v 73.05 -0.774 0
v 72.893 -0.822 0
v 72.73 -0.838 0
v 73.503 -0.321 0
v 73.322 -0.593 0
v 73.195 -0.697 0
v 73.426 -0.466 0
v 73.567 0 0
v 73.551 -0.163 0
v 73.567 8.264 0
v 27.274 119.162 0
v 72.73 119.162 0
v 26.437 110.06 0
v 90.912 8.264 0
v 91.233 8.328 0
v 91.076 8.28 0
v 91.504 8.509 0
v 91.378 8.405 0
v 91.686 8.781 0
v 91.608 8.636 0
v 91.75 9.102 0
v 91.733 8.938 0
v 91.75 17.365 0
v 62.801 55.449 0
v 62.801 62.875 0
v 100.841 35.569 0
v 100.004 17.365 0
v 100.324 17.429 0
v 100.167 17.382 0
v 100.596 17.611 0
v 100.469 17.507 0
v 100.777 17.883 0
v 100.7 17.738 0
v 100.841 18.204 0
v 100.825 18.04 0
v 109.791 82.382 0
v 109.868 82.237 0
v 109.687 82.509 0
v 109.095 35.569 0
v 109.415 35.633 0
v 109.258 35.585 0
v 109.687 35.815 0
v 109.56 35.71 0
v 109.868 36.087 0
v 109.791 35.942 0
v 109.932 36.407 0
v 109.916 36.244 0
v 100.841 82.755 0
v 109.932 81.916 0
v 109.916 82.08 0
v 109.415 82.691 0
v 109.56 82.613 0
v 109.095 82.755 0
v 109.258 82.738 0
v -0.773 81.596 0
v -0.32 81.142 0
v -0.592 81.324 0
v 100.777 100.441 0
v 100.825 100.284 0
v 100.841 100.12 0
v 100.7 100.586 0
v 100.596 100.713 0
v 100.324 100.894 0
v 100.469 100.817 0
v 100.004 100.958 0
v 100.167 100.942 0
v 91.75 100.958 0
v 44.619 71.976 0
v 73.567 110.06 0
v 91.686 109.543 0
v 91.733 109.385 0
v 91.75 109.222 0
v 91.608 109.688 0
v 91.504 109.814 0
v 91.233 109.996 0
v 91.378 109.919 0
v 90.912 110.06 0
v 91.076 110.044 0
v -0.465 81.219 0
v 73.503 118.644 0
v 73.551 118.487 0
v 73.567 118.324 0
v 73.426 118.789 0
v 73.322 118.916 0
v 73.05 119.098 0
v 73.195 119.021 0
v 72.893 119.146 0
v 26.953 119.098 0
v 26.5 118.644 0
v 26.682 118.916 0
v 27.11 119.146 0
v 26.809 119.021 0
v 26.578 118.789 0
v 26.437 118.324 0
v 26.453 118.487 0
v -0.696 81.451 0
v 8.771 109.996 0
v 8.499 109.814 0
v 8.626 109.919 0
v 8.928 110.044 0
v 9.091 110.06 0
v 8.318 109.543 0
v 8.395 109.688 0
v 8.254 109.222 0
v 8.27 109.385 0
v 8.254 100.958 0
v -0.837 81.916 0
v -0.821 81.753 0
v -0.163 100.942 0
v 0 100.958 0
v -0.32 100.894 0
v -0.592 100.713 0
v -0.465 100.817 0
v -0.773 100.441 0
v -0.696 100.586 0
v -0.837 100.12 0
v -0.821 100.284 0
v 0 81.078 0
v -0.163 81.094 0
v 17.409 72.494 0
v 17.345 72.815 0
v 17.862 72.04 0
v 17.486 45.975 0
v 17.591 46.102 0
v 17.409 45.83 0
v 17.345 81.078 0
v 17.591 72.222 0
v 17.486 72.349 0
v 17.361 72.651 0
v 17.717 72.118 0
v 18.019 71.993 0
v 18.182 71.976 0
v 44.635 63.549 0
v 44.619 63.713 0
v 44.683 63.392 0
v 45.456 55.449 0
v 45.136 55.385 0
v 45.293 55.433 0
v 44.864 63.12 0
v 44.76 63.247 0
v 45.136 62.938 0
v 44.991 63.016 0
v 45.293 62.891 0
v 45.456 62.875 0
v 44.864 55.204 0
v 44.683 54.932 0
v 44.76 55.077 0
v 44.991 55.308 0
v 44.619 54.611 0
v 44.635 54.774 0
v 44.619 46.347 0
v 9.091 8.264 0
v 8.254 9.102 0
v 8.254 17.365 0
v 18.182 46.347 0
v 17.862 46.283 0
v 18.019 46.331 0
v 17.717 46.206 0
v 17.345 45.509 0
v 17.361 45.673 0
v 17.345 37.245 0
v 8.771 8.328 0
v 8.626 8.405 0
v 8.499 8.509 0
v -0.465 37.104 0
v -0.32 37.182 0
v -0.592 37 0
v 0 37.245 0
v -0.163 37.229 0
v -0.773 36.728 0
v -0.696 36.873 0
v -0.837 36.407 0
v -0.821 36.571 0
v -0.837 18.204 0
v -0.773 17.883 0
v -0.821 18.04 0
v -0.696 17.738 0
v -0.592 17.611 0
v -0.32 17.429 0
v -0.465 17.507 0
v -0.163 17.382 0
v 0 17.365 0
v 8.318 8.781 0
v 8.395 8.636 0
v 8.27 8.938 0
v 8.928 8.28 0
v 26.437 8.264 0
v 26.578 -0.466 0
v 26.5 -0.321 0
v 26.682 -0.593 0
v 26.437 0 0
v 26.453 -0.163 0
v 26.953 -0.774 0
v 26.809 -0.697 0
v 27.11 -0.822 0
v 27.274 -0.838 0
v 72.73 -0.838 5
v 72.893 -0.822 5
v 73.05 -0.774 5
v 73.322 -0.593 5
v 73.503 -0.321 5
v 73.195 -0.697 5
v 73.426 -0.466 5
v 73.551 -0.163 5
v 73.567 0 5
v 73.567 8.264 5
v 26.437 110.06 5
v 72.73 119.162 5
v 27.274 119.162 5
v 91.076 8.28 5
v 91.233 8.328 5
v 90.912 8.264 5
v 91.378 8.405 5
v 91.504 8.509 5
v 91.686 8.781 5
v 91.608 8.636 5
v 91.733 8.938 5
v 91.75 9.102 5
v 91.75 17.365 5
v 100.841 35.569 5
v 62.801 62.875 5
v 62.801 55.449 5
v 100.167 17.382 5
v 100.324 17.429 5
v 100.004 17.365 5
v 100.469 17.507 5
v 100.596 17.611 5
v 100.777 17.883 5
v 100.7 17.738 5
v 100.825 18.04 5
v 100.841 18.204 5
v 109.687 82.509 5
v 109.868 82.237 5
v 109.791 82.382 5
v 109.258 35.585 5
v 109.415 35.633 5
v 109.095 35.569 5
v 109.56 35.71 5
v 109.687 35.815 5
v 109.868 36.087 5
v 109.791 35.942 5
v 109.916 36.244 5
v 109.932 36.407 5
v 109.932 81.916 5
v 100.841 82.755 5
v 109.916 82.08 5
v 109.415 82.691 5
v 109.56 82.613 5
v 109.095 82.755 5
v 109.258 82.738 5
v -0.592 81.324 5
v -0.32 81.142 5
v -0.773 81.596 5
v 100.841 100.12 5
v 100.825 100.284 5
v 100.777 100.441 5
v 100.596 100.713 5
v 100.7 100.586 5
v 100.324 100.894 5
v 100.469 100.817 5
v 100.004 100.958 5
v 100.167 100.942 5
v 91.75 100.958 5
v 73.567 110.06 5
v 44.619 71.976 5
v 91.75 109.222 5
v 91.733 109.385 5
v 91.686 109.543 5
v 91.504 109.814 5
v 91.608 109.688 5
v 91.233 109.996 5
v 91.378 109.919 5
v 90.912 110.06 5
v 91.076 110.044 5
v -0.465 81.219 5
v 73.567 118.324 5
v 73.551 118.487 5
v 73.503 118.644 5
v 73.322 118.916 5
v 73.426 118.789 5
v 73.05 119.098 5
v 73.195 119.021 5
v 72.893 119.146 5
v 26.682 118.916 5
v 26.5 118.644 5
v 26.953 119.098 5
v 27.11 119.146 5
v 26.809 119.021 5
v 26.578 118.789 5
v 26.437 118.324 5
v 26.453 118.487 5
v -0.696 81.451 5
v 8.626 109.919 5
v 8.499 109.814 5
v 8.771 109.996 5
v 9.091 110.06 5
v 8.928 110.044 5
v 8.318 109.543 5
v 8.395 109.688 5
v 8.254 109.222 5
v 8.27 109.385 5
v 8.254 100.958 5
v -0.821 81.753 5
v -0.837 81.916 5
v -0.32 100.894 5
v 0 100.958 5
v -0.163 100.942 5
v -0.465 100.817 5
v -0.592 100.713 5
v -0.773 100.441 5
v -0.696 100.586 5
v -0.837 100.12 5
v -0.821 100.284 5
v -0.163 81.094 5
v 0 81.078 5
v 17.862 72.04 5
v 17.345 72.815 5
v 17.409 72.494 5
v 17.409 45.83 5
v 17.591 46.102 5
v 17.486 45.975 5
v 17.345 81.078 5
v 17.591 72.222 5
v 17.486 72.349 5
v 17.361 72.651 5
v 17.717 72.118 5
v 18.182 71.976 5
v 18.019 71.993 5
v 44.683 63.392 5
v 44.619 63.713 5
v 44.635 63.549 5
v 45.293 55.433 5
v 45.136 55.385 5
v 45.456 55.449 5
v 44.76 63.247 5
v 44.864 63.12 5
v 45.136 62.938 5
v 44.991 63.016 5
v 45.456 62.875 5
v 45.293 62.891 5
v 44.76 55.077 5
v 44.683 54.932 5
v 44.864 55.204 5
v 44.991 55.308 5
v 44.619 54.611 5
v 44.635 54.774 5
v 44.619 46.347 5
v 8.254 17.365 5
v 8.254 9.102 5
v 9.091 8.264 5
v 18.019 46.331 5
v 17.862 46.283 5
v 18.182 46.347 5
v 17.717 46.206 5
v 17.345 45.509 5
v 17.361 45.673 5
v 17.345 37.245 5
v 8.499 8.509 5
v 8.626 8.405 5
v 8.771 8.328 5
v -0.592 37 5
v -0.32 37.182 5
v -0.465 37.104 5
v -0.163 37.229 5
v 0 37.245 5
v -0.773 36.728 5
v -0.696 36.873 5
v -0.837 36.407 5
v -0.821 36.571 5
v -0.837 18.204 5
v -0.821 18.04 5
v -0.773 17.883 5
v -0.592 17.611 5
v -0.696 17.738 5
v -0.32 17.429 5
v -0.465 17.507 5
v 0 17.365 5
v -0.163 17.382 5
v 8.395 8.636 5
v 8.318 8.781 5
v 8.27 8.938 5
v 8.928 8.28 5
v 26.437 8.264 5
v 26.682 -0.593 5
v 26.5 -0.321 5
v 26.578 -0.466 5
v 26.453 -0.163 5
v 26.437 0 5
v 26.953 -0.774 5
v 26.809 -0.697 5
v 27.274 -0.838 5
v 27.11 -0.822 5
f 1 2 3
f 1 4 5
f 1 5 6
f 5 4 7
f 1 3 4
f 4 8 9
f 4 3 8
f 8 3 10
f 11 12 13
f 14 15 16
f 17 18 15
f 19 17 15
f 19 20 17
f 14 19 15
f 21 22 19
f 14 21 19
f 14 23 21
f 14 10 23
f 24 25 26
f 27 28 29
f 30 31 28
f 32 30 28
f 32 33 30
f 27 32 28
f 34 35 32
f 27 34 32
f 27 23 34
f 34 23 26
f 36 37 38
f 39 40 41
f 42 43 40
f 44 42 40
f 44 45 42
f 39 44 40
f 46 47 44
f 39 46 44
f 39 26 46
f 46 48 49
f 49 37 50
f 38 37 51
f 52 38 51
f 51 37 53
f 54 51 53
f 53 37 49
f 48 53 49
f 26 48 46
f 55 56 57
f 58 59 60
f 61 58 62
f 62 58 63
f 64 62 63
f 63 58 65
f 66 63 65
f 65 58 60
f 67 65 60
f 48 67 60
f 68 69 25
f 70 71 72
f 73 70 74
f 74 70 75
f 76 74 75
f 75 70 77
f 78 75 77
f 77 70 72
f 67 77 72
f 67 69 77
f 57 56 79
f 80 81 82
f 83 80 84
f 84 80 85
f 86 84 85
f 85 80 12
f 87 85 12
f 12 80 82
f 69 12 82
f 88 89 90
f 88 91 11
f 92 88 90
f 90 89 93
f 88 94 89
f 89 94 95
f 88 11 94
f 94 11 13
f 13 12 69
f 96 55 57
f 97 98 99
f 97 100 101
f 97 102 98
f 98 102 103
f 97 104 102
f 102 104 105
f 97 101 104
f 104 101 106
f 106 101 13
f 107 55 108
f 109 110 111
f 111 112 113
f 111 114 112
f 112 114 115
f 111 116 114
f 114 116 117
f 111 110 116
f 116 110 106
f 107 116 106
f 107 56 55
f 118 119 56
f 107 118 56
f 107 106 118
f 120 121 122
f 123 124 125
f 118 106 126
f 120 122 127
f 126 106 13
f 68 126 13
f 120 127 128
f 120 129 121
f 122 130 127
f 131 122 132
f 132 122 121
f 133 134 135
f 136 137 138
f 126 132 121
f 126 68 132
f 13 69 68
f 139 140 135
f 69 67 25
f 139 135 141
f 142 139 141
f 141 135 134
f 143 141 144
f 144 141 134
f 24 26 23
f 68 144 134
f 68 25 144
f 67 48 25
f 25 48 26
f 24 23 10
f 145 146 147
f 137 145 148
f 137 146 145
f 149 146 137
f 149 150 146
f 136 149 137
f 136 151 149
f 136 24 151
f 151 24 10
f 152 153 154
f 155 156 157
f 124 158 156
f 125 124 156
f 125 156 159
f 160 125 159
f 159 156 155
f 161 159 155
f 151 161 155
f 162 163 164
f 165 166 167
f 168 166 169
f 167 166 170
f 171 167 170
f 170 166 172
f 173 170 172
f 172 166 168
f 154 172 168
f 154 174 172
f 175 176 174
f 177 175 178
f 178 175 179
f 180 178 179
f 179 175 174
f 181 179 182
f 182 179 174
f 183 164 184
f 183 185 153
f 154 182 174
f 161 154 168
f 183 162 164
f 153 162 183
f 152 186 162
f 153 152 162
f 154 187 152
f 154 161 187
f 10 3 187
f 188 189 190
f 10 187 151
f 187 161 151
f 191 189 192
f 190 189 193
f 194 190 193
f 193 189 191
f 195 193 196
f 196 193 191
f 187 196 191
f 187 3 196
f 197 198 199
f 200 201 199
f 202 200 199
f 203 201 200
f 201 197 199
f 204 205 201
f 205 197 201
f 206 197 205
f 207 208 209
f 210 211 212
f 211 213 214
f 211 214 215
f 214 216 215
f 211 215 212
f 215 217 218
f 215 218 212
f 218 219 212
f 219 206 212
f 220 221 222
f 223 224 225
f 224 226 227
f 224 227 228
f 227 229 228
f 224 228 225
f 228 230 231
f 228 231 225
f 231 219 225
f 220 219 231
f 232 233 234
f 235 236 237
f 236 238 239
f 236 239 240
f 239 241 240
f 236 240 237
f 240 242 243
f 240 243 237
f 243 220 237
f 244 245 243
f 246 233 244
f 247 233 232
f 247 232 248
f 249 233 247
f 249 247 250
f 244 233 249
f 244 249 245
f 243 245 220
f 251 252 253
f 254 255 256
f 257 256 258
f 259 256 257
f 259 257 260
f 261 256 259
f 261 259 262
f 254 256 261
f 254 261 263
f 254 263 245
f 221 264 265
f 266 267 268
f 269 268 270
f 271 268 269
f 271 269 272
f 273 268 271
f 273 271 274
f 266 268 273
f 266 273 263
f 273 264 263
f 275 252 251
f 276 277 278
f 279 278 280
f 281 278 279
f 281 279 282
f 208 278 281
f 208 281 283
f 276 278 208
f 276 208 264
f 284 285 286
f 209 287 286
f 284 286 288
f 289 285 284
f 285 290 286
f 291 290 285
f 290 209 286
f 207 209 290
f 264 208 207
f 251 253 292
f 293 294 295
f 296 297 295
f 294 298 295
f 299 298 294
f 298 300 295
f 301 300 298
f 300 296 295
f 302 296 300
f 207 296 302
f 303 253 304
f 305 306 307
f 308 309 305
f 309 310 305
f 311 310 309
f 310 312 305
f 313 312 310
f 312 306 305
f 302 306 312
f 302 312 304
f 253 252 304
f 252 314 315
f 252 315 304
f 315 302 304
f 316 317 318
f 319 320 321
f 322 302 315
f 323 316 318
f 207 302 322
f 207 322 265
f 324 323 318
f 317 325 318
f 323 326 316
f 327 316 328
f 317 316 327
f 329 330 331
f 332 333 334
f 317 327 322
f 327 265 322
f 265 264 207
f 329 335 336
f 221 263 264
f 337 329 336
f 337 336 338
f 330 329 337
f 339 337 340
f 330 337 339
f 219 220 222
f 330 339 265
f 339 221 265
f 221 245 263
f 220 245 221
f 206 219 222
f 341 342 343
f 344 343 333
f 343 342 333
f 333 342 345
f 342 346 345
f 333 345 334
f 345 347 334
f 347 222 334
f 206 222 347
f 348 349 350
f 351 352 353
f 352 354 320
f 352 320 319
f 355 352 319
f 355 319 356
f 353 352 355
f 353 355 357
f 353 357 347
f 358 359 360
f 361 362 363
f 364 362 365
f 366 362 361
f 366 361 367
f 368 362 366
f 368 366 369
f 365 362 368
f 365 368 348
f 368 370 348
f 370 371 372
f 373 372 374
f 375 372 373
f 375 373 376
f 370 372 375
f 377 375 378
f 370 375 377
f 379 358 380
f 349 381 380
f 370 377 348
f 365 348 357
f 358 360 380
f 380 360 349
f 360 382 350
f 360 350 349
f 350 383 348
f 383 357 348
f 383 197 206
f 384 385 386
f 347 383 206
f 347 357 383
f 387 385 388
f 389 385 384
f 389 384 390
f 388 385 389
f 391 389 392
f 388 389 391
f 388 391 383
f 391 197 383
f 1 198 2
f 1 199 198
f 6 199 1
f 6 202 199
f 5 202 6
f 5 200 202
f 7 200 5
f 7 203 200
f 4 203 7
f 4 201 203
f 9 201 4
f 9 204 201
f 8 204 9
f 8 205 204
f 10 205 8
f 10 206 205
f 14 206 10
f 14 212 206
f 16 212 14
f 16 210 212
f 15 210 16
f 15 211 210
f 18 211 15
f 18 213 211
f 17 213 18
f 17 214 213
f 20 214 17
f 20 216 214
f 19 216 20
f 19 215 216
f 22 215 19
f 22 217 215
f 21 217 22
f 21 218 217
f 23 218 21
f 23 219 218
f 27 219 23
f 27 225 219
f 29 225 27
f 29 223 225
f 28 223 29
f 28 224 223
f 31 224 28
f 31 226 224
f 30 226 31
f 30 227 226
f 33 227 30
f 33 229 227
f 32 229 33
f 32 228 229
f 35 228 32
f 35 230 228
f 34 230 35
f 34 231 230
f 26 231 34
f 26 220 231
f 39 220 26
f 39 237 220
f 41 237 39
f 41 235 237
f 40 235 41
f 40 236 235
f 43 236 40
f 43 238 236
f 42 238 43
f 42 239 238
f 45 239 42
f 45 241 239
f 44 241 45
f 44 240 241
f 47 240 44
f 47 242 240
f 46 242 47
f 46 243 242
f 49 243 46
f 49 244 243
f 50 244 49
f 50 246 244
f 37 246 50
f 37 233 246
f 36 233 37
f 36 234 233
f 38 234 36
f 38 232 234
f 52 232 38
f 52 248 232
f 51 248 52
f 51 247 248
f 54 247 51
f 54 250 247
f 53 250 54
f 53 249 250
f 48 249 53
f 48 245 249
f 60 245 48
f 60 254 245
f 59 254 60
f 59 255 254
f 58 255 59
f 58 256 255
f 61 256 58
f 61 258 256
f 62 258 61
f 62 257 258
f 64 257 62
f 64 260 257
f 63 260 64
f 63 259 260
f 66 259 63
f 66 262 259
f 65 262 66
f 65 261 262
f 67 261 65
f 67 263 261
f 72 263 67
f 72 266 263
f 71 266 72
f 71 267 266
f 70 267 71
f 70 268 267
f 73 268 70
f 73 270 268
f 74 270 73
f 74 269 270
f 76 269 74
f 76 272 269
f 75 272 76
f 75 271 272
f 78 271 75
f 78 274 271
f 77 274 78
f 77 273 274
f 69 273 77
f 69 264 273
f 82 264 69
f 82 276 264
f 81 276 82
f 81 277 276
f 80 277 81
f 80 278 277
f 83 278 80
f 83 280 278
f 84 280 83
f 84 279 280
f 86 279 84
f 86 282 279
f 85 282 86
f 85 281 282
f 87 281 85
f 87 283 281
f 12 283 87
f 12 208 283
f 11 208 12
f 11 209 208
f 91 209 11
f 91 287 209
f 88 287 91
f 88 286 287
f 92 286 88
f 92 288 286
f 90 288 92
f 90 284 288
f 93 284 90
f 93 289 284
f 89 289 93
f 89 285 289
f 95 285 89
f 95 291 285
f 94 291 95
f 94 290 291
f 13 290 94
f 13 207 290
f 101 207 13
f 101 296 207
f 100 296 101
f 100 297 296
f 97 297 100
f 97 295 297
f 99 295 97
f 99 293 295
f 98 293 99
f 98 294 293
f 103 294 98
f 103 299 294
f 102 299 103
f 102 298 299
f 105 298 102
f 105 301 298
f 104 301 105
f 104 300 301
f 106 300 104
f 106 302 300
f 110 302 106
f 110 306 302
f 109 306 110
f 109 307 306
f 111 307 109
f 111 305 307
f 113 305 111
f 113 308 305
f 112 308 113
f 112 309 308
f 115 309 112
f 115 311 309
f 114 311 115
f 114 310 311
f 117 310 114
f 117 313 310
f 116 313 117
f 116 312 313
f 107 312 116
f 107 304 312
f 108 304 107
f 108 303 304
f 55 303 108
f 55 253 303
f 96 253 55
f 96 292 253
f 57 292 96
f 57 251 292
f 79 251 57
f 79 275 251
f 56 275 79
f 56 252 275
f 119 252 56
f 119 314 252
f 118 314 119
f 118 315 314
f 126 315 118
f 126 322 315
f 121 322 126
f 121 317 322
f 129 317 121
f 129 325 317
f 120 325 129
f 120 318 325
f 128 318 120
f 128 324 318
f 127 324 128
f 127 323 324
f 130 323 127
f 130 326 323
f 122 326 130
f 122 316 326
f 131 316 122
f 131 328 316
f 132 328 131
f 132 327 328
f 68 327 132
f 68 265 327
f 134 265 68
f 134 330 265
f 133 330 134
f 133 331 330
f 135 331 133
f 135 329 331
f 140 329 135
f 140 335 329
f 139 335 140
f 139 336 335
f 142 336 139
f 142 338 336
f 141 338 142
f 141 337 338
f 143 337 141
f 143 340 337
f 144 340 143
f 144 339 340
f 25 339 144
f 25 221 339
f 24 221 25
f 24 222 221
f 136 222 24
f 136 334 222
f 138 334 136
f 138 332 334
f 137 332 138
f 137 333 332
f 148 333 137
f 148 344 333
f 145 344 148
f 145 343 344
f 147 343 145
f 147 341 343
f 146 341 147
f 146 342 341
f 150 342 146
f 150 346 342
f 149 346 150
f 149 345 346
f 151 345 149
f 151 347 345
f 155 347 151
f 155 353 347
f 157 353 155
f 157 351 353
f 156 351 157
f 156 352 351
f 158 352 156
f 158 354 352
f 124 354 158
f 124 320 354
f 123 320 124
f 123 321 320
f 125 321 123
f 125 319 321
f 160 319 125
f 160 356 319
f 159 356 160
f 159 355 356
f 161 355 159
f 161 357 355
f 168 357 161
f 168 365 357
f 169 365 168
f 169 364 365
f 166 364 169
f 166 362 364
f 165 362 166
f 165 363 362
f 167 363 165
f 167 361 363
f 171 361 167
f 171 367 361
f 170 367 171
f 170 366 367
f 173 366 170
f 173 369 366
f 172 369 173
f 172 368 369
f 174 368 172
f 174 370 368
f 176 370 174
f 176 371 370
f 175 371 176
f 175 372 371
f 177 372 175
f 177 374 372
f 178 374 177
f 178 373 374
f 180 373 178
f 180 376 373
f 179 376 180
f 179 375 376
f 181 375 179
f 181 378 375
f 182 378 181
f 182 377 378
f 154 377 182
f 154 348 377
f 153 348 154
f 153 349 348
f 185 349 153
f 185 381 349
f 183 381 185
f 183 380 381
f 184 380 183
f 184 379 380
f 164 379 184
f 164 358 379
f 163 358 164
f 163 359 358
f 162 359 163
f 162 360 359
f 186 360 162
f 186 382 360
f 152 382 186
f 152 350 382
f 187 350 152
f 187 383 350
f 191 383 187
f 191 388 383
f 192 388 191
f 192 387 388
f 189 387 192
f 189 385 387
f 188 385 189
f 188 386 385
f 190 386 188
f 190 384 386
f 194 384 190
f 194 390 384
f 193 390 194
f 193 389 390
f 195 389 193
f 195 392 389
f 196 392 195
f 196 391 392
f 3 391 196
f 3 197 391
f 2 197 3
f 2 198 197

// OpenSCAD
/*
 * Customizable Origami - Pac-Man - https://www.thingiverse.com/thing:2674461
 * by Dennis Hofmann - https://www.thingiverse.com/mightynozzle/about
 * created 2017-11-28
 * version v1.0
 *
 * Changelog
 * --------------
 * v1.0:
 *      - final design
 * --------------
 * 
 * This work is licensed under the Creative Commons - Attribution - NonCommercial - ShareAlike license.
 * https://creativecommons.org/licenses/by-nc-sa/3.0/
 */


 // Parameter Section //
//-------------------//

// preview[view:north, tilt:top]

// The maximum size of the longest side. The shorter side will be automatically resized in same ratio.
max_size_in_millimeter = 120; //[20:300]

// The height of the model.
model_height_in_millimeter = 5; //[0.2:0.2:100]

// Thickness of the outer outline.
outline_size_in_millimeter = 1.2; //[0.5:0.1:20]

// Thickness of the inner outline.
inline_size_in_millimeter = 0.7; //[0.5:0.1:20]

// Roundiness of the ends of the inner outlines.
inline_edge_radius_in_millimeter = 0.3; //[0.0:0.1:5]

// Flip model
flip_model = "no"; //[yes,no]

// Fill Mode
fill_mode = "solid"; //[solid,hollow]

/*[hidden]*/
max_size = max_size_in_millimeter;
model_height = model_height_in_millimeter;
$fn=32;

// Outer Points
A1 = [0, 4];
A2 = [0, 2];
A3 = [1, 2];
A4 = [1, 1];
A5 = [3, 1];
A6 = [3, 0];
A7 = [8, 0];
A8 = [8, 1];
A9 = [10, 1];
A10 = [10, 2];
A11 = [11, 2];
A12 = [11, 4];
A13 = [12, 4];
A14 = [12, 9];
A15 = [11, 9];
A16 = [11, 11];
A17 = [10, 11];
A18 = [10, 12];
A19 = [8, 12];
A20 = [8, 13];
A21 = [3, 13];
A22 = [3, 12];
A23 = [1, 12];
A24 = [1, 11];
A25 = [0, 11];
A26 = [0, 9];
A27 = [2, 9];
A28 = [2, 8];
A29 = [5, 8];
A30 = [5, 7];
A31 = [7, 7];
A32 = [7, 6];
A33 = [5, 6];
A34 = [5, 5];
A35 = [2, 5];
A36 = [2, 4];

outline = [A1, A2, A3, A4, A5, A6, A7, A8, A9, A10, A11, A12, A13, A14, A15, A16, A17, A18, A19, A20, A21, A22, A23, A24, A25, A26, A27, A28, A29, A30, A31, A32, A33, A34, A35, A36];

// Inner Points

// Polygons
C1 = [A1, A2, A3, A4, A5, A6, A7, A8, A9, A10, A11, A12, A13, A14, A15, A16, A17, A18, A19, A20, A21, A22, A23, A24, A25, A26, A27, A28, A29, A30, A31, A32, A33, A34, A35, A36];

cut_polygons = [C1];

min_x = A2[0];
min_y = A6[1];
max_x = A14[0];
max_y = A21[1];

x_size = max_x - min_x;
y_size = max_y - min_y;

x_factor = max_size / x_size;
y_factor = max_size / y_size;

inline_size = x_size > y_size ? inline_size_in_millimeter / x_factor / 2: inline_size_in_millimeter / y_factor / 2;
inline_edge_radius = x_size > y_size ? inline_edge_radius_in_millimeter / x_factor: inline_edge_radius_in_millimeter / y_factor;
outline_size = x_size > y_size ? outline_size_in_millimeter / x_factor - inline_size: outline_size_in_millimeter / y_factor - inline_size;


 // Program Section //
//-----------------//

if(x_size > y_size) {
    resize(newsize=[max_size, x_factor * y_size, model_height]){
        if(flip_model == "yes") {
            mirror([0,1,0]) {
                rotate([180,180,0]) {    
                    create(outline, cut_polygons);
                }
            }
        } else {
            create(outline, cut_polygons);
        }
    }
} else {
    resize(newsize=[y_factor * x_size, max_size, model_height]){
        if(flip_model == "yes") {
            mirror([0,1,0]) {
                rotate([180,180,0]) {    
                    create(outline, cut_polygons);
                }
            }
        } else {
            create(outline, cut_polygons);
        }
    }
}


 // Module Section //
//----------------//

module create() {
    linear_extrude(height=1) {
        difference() {
            offset(r = -0) {
                offset(r = +outline_size) {
                    polygon(points = outline, convexity = 10);
                }
            }
            if(fill_mode == "hollow") {
                for(cut_polygon = [0:len(cut_polygons)]) {
                    offset(r = +inline_edge_radius) {
                        offset(r = -inline_size - inline_edge_radius) {
                            polygon(points = cut_polygons[cut_polygon], convexity = 10);
                        }
                    }
                }
            }
        }
    }
}
